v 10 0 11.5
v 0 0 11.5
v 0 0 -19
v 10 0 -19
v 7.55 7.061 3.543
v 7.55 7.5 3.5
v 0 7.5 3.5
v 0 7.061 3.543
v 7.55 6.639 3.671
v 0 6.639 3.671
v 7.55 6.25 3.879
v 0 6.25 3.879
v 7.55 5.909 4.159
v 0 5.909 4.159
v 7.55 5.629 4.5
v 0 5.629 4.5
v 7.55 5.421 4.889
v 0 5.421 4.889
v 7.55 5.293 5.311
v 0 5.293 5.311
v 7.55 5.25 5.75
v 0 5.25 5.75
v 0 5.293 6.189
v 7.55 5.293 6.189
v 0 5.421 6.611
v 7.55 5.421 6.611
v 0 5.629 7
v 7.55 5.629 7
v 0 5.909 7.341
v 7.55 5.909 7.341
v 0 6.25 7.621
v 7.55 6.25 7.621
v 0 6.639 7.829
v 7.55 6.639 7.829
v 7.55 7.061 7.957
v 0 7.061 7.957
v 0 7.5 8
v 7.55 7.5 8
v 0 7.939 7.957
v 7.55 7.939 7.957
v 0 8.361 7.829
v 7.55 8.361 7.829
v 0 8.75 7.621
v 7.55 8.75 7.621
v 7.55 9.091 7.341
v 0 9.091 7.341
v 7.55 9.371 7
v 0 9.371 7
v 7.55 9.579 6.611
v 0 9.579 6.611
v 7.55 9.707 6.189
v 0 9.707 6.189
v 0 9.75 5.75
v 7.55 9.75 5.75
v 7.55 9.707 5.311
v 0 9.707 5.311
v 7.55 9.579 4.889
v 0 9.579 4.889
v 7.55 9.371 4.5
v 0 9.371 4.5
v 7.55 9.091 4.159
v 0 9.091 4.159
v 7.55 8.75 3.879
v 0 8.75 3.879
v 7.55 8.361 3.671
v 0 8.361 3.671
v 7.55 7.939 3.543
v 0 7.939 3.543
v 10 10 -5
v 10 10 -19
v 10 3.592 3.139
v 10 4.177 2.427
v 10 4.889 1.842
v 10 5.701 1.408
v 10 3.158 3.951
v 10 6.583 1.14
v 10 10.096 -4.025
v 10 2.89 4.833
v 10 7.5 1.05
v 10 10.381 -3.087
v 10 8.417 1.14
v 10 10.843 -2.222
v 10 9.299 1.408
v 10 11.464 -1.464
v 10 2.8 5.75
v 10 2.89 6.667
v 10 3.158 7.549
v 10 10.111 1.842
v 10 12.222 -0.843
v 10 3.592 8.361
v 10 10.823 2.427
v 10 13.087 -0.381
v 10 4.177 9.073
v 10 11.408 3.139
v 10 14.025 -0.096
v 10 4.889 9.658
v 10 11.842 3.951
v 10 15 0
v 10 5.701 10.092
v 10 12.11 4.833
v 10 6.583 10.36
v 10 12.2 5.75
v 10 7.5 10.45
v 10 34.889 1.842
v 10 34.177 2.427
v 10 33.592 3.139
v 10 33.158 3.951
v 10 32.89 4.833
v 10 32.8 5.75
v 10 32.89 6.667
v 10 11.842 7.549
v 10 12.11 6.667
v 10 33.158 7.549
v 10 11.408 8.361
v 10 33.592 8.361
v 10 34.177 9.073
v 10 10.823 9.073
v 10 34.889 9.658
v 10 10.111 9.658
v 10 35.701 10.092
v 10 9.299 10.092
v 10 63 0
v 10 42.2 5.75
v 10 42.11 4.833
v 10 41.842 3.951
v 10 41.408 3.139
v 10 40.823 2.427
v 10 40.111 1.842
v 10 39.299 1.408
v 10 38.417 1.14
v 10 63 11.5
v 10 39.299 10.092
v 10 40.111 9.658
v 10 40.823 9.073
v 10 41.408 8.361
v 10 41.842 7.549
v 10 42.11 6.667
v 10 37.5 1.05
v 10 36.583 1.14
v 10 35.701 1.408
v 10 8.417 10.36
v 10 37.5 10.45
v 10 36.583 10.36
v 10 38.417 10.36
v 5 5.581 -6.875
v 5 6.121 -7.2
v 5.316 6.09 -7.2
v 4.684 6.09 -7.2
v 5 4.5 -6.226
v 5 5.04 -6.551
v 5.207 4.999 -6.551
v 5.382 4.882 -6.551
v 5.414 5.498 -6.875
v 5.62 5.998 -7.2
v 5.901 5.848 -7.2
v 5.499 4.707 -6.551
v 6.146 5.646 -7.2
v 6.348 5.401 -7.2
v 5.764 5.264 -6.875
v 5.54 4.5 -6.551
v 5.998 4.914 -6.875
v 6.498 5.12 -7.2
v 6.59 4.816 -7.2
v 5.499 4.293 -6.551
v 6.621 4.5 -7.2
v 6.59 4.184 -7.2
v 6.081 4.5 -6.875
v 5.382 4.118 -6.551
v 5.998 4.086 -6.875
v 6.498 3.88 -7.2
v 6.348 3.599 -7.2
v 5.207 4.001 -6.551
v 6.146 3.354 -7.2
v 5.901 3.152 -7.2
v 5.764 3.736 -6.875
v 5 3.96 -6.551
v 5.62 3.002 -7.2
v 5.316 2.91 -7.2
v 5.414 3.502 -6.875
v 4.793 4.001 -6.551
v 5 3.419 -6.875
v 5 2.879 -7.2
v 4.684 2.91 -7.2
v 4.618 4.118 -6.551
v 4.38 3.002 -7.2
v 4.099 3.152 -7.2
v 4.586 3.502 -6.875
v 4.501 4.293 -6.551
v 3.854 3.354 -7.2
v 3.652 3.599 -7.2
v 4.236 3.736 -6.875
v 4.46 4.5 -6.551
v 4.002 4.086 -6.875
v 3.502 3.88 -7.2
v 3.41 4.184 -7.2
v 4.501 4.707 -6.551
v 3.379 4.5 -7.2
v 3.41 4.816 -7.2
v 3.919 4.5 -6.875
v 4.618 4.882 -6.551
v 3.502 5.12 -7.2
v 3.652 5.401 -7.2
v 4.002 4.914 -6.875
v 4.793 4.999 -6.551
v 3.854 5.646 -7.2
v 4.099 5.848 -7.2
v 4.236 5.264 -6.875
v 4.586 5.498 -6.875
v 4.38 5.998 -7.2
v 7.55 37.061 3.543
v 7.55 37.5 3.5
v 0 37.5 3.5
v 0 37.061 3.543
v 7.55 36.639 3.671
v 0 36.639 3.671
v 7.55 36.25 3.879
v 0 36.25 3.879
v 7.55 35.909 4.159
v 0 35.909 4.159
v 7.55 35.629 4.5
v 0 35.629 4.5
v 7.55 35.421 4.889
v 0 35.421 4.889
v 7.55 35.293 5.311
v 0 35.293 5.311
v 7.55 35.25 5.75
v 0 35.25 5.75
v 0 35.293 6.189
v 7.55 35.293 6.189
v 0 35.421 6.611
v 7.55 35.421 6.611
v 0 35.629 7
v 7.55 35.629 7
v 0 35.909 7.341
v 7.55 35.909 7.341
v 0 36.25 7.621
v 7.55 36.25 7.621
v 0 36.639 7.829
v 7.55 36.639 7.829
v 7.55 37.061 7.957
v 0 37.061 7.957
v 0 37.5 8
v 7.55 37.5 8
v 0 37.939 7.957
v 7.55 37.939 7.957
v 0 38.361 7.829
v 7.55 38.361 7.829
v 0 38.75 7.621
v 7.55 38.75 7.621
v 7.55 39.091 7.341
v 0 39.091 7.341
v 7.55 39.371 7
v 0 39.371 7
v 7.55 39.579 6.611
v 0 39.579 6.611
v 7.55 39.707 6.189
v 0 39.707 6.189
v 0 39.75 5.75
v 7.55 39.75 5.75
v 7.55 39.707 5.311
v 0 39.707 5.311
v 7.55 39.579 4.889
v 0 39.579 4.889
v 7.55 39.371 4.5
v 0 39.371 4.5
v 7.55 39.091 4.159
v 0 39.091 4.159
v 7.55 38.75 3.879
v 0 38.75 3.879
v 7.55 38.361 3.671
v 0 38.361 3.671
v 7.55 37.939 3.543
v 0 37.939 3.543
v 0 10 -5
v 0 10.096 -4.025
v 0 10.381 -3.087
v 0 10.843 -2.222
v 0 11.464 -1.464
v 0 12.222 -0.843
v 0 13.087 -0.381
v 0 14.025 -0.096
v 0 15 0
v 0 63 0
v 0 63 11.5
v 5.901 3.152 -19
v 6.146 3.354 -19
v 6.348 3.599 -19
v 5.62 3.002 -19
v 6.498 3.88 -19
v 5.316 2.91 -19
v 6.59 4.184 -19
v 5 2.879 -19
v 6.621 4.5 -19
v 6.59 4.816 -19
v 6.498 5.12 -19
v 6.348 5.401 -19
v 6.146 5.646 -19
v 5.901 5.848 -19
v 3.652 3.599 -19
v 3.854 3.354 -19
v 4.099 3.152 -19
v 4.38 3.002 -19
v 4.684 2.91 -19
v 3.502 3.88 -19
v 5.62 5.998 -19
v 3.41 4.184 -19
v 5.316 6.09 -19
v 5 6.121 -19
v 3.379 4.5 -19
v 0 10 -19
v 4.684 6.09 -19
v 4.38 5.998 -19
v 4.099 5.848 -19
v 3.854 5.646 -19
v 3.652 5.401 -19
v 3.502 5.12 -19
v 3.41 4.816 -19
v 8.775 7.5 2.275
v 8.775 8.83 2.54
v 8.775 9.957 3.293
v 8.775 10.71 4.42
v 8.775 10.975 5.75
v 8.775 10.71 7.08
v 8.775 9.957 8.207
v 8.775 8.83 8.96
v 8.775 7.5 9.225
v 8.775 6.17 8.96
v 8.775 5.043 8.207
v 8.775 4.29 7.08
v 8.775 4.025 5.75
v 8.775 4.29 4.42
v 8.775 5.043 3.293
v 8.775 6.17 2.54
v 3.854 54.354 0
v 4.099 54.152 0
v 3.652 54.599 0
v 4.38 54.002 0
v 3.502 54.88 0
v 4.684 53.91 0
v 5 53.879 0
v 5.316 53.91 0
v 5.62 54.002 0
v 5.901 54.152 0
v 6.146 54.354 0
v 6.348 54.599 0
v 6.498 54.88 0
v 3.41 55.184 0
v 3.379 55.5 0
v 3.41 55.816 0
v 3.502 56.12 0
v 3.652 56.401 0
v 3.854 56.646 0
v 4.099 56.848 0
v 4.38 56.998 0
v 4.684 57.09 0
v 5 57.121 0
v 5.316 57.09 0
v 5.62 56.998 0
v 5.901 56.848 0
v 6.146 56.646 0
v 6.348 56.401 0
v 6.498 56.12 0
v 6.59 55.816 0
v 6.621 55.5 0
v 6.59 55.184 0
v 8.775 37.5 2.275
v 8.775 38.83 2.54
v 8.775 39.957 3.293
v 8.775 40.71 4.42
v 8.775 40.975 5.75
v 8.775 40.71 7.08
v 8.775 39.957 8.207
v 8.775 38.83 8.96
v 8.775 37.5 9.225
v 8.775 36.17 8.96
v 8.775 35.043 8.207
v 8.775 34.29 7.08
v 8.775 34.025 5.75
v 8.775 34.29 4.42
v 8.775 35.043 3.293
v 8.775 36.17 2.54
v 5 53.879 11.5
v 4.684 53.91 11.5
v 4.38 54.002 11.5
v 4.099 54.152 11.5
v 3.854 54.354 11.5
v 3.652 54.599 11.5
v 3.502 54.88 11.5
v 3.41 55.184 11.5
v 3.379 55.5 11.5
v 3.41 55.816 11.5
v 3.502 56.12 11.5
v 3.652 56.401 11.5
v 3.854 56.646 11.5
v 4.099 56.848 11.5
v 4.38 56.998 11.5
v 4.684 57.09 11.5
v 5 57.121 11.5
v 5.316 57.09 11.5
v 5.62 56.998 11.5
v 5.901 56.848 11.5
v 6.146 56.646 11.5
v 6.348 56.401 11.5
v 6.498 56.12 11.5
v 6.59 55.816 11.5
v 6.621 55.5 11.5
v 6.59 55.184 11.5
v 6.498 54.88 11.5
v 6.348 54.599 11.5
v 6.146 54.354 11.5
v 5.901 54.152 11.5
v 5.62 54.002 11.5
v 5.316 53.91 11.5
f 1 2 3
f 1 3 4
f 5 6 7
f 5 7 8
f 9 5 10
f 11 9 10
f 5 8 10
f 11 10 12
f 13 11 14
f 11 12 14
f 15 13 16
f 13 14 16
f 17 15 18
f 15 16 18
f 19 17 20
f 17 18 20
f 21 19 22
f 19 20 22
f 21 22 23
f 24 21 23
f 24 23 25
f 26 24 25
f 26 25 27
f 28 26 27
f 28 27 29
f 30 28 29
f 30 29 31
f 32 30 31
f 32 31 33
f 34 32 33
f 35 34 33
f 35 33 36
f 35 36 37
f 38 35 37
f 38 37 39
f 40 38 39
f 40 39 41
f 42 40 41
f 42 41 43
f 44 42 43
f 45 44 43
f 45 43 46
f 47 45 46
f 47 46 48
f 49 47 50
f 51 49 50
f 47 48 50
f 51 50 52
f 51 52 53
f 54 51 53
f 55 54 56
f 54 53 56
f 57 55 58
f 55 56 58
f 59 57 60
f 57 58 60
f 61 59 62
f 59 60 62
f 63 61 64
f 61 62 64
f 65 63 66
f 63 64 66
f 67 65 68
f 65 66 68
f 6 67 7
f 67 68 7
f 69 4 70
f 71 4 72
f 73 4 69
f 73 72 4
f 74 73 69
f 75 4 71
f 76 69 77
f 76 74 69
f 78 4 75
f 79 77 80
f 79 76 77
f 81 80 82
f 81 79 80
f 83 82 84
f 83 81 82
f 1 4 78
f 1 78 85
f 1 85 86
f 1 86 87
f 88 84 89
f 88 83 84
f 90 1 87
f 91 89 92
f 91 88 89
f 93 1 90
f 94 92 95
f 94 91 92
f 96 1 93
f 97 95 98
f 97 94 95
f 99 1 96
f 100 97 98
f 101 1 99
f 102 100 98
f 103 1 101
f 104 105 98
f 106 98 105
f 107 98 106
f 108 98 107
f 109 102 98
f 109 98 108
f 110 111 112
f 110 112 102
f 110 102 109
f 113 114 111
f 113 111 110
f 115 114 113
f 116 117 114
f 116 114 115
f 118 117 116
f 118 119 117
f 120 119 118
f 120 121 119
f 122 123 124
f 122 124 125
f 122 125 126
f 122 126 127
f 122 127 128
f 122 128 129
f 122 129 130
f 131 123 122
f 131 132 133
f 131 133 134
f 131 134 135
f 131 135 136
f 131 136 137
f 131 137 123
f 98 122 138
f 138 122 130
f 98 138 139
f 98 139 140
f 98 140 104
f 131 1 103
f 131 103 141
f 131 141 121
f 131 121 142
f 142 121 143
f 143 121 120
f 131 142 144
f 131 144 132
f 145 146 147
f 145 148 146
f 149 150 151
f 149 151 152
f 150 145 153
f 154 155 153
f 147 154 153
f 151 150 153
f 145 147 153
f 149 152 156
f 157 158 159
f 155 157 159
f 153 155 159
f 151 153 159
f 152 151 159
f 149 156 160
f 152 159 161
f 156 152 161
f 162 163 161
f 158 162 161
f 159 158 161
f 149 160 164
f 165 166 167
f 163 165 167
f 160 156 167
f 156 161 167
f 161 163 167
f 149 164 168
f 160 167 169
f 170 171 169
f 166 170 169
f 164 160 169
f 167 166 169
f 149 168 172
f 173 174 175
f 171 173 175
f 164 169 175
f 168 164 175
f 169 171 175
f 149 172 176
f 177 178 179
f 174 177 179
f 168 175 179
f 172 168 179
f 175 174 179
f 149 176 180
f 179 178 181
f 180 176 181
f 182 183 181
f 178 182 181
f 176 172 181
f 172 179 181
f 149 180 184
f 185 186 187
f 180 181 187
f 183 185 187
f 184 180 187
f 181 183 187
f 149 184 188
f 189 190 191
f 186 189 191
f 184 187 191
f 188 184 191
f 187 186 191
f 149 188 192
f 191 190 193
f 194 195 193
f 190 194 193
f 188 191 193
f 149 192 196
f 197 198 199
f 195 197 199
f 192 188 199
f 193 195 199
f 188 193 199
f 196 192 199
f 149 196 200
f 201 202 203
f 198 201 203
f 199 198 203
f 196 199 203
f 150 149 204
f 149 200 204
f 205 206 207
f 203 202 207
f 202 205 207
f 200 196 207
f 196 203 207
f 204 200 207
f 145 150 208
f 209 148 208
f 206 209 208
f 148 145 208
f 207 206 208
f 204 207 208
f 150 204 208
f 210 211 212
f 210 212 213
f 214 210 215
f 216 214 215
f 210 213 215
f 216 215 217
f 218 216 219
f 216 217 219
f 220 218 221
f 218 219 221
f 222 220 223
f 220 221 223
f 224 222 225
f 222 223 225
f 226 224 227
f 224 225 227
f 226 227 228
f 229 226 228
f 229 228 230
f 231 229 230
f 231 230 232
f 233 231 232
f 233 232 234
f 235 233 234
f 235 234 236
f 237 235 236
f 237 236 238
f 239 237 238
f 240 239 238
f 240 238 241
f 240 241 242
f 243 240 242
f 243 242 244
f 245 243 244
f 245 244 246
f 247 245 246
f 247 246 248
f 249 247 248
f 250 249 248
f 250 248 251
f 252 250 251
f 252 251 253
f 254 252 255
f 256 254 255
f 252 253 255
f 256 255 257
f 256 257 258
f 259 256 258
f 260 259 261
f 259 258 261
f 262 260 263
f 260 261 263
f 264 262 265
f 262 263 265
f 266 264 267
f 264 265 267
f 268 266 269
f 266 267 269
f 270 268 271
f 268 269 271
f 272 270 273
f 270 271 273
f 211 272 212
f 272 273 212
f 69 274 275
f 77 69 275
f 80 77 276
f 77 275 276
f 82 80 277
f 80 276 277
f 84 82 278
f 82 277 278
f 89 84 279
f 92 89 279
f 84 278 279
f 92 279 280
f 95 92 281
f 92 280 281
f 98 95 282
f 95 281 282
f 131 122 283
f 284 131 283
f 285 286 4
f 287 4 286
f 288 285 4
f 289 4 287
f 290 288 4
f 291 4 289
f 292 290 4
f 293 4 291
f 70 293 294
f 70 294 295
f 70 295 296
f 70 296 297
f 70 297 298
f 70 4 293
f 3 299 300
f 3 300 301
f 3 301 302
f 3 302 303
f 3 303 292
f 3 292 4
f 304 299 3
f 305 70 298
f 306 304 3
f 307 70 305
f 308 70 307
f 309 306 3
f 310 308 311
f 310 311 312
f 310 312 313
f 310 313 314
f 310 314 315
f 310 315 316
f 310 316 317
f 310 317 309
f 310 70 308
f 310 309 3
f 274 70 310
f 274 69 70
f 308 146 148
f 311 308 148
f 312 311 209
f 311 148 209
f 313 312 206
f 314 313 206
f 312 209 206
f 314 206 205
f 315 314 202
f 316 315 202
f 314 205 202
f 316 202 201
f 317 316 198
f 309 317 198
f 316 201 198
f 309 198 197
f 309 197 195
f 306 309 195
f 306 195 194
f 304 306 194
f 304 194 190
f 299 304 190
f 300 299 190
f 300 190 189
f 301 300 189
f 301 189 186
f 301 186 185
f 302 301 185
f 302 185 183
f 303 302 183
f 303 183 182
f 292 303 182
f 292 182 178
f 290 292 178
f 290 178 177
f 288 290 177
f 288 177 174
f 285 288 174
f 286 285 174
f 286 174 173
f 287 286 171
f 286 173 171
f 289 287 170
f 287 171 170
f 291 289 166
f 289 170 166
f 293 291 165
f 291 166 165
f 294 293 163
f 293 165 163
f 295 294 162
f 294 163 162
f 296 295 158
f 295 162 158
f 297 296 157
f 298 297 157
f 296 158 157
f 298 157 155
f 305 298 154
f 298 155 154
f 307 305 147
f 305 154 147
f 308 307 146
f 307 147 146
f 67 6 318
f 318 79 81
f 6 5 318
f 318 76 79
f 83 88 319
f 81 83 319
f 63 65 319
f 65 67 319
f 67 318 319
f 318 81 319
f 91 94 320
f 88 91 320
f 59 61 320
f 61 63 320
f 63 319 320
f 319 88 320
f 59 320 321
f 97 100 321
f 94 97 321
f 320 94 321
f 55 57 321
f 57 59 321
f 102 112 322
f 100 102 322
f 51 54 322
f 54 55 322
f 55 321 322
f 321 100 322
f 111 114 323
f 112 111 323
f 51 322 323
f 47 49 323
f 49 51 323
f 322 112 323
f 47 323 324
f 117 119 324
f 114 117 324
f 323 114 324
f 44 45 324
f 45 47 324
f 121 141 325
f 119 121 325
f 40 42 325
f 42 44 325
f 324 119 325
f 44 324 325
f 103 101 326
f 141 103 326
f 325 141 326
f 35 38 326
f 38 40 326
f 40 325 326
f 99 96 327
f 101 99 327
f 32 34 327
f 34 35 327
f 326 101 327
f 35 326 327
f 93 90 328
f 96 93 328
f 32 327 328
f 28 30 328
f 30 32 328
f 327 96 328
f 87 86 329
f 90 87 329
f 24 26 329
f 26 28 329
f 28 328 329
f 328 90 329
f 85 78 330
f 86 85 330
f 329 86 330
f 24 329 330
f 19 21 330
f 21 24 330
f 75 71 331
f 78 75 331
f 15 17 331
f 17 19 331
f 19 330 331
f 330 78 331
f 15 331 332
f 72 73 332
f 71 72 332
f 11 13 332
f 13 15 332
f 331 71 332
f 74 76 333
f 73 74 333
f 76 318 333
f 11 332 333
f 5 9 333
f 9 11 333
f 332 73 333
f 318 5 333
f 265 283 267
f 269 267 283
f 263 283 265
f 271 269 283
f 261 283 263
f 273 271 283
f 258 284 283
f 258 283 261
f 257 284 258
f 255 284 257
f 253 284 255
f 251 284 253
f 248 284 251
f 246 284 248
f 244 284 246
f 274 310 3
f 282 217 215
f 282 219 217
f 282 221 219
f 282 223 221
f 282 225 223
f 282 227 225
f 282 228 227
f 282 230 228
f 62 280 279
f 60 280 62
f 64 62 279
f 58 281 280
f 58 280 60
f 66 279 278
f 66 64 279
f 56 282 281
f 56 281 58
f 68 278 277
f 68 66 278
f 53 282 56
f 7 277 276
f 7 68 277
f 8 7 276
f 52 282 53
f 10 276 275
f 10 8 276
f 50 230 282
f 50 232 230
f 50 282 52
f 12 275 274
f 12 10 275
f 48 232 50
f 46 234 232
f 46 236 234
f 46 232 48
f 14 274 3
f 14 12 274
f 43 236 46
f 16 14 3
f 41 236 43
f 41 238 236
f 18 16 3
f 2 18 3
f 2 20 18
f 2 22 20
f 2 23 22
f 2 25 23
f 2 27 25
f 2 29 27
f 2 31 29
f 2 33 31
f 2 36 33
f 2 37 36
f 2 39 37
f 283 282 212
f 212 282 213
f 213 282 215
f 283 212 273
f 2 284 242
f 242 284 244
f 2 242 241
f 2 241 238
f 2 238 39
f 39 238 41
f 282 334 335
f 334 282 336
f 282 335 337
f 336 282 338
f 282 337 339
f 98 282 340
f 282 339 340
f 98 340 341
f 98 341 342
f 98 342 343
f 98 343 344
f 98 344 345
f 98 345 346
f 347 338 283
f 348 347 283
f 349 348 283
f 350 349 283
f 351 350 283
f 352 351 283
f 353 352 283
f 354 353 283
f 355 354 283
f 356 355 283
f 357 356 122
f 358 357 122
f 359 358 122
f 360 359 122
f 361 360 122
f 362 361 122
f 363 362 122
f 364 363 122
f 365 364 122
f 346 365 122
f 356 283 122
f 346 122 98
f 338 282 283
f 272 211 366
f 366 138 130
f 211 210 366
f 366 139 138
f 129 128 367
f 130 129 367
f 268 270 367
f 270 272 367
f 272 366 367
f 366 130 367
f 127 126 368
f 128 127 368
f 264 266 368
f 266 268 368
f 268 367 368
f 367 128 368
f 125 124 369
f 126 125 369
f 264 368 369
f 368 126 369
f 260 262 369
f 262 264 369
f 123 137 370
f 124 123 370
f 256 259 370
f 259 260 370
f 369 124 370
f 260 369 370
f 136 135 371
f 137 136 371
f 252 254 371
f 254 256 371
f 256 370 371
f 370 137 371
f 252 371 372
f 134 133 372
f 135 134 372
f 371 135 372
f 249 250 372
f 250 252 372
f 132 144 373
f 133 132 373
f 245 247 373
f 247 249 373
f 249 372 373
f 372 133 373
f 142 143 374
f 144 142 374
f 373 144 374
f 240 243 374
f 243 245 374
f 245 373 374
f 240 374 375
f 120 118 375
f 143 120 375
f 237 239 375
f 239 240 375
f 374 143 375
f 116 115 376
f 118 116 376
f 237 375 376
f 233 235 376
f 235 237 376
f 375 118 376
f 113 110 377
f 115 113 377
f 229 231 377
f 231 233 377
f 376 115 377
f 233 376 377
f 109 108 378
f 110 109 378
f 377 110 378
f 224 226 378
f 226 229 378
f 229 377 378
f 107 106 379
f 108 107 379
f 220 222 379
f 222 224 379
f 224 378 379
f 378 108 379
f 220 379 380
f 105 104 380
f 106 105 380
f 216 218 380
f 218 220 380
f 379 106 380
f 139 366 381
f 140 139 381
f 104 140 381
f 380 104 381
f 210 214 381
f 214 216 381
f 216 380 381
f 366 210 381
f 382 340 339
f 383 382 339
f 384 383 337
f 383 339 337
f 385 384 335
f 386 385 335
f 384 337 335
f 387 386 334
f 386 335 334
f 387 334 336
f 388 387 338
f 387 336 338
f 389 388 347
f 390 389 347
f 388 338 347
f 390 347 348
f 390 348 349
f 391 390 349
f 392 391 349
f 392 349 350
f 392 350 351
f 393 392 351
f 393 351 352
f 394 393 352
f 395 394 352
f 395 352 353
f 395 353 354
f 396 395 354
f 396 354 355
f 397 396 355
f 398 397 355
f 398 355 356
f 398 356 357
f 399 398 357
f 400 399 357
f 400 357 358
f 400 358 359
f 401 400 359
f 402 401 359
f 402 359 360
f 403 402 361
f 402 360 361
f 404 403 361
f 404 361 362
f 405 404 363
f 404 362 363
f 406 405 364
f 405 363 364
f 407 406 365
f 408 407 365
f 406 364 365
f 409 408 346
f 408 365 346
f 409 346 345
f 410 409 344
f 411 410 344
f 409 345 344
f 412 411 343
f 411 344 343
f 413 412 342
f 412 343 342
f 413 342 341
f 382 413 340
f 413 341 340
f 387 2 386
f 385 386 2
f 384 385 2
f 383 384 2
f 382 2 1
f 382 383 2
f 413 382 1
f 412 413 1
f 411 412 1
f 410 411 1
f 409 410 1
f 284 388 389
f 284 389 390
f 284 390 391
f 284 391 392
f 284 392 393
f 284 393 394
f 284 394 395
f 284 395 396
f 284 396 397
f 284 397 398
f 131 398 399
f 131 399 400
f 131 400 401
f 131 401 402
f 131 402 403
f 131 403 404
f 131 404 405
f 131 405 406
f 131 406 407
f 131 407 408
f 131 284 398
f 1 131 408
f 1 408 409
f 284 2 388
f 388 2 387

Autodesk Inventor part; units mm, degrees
ref_plane "YZ Plane" through (0, 0, 0) normal (1, 0, 0) x (0, 1, 0)
ref_plane "XZ Plane" through (0, 0, 0) normal (0, 1, 0) x (-1, 0, 0)
ref_plane "XY Plane" through (0, 0, 0) normal (0, 0, 1) x (1, 0, 0)
sketch "Sketch1" plane through (0, 0, 0) normal (0, 0, 1) x (1, 0, 0)
  line L0 (0, 0) -> (10, 0)
  line L1 (10, 0) -> (10, 63)
  line L2 (10, 63) -> (0, 63)
  line L3 (0, 63) -> (0, 0)
  dimension "d0" = 10
  dimension "d1" = 63
extrude "Extrusion1" add sketch "Sketch1" along normal blind 11.5
sketch "Sketch2" plane through (0, 0, 11.5) normal (0, 0, 1) x (1, 0, 0)
  line L0 (10, 63) -> (0, 63) projected
  line L1 (0, 0) -> (10, 0) projected
  point P0 (5, 55.5)
  point P1 (5, 63)
  dimension "d5" = 7.5
  dimension "d24" = 63
hole "Hole1" at (5, 55.5, 11.5) direction (0, 0, -1) diameter 3.242 end through all thread size "M4x0.7" class "6H" standard "ANSI Metric M Profile"
sketch "Sketch3" plane through (10, 0, 0) normal (1, 0, 0) x (0, 0, -1)
  line L0 (0, 63) -> (-11.5, 63) projected
  line L1 (0, 0) -> (-11.5, 0) projected
  point P0 (-5.75, 37.5)
  point P1 (-5.75, 7.5)
  point P2 (-5.75, 63)
  dimension "d16" = 7.5
  dimension "d25" = 30
hole "Hole2" at (10, 37.5, 5.75) at (10, 7.5, 5.75) direction (-1, 0, 0) diameter 4.5 end through all countersink diameter 9.4 countersink angle 90 clearance for "Flat Head Machine Screw" size "M4" standard "Ansi Metric M Profile"
sketch "Sketch4" plane through (0, 0, 0) normal (0, 0, -1) x (-1, 0, 0)
  point P0 (0, 0)
sketch "Sketch5" plane through (0, 0, 0) normal (0, 0, -1) x (-1, 0, 0)
  line L0 (0, 0) -> (-10, 0)
  line L1 (-10, 0) -> (-10, 10)
  line L2 (-10, 10) -> (0, 10)
  line L3 (0, 10) -> (0, 0)
  line L4 (-10, 0) -> (-10, 63) projected
  dimension "d26" = 10
extrude "Extrusion2" add sketch "Sketch5" along normal blind 19
sketch "Sketch6" plane through (0, 0, -19) normal (0, 0, -1) x (-1, 0, 0)
  line L0 (-10, 0) -> (0, 0) projected
  line L1 (0, 10) -> (-10, 10) projected
  circle A0 centre (-5, 55.5) radius 1.621 projected
  point P0 (-5, 4.5)
  point P1 (-5, 0)
  dimension "d31" = 51
hole "Hole3" at (5, 4.5, -19) direction (0, 0, 1) diameter 3.242 depth 11.8 tip angle 118 thread size "M4x0.7" class "6H" standard "ANSI Metric M Profile"
fillet "Fillet1" radius 5 1 edges at (5, 10, 0)
properties part number "Pancake_Flexi Pipe Mount 2" material "Aluminum 6061"
